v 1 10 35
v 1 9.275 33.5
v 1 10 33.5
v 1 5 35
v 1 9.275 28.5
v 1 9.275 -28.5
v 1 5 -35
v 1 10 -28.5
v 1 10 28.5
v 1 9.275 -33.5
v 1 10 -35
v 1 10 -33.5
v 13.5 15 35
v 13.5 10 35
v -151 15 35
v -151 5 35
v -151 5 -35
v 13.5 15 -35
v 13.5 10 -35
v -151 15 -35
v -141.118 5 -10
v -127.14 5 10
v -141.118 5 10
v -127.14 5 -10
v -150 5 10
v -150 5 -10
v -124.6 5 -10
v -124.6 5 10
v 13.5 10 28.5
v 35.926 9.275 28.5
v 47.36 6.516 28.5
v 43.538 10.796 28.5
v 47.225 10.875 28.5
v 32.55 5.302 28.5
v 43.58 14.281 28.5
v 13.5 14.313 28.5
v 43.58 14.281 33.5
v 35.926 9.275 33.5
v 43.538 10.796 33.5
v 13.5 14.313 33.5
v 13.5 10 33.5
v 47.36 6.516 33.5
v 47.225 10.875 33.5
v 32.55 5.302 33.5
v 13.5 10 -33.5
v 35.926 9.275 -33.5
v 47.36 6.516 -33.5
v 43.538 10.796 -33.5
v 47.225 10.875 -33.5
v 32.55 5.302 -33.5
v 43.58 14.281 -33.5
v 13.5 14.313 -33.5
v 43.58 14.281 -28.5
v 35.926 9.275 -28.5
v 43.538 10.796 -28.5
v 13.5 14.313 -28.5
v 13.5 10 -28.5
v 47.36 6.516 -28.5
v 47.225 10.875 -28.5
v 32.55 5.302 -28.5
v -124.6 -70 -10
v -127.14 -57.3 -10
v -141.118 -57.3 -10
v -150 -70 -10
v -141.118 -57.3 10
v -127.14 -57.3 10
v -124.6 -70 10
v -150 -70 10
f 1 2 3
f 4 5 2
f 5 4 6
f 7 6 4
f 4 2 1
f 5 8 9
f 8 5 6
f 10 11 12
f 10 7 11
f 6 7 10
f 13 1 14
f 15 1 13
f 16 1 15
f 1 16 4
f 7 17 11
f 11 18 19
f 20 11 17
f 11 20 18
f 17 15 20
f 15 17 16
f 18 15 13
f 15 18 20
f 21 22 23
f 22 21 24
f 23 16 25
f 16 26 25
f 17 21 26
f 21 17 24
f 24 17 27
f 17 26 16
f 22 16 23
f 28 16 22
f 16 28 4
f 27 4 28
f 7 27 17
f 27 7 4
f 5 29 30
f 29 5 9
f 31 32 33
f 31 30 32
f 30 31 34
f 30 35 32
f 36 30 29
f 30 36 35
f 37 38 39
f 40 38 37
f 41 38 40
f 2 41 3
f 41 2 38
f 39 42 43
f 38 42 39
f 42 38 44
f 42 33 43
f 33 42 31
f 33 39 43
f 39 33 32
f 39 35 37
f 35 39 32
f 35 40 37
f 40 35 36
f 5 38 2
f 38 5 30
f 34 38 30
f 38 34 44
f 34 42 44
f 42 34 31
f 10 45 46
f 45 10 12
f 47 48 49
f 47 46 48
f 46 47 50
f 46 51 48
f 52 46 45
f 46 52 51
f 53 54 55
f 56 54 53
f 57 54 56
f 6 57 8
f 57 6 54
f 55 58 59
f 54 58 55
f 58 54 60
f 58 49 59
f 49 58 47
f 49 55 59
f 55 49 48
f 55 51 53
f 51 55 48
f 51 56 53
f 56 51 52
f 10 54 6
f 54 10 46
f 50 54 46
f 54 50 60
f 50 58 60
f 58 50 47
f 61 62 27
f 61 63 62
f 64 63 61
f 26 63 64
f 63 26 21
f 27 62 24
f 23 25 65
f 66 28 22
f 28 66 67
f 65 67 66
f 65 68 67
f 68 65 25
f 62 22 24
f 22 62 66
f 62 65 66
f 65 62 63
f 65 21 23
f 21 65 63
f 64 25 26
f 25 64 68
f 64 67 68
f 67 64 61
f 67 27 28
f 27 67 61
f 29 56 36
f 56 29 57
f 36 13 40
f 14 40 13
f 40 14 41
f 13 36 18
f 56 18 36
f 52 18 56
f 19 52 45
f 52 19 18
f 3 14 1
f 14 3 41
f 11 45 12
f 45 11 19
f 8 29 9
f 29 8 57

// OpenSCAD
union() {
	translate([-75, 10, 0])
		cube([152, 10, 70], center = true);
	translate([-7.22, 5, 28.5])
		linear_extrude(height = 5) import("hook.dxf");
	translate([-7.22, 5, -33.5])
		linear_extrude(height = 5) import("hook.dxf");
	translate([-150, -70, -10])
		linear_extrude(height = 20) import("loop.dxf");
	translate([5, 12.5, 0])
		cube([17, 5, 70], center = true);
}
